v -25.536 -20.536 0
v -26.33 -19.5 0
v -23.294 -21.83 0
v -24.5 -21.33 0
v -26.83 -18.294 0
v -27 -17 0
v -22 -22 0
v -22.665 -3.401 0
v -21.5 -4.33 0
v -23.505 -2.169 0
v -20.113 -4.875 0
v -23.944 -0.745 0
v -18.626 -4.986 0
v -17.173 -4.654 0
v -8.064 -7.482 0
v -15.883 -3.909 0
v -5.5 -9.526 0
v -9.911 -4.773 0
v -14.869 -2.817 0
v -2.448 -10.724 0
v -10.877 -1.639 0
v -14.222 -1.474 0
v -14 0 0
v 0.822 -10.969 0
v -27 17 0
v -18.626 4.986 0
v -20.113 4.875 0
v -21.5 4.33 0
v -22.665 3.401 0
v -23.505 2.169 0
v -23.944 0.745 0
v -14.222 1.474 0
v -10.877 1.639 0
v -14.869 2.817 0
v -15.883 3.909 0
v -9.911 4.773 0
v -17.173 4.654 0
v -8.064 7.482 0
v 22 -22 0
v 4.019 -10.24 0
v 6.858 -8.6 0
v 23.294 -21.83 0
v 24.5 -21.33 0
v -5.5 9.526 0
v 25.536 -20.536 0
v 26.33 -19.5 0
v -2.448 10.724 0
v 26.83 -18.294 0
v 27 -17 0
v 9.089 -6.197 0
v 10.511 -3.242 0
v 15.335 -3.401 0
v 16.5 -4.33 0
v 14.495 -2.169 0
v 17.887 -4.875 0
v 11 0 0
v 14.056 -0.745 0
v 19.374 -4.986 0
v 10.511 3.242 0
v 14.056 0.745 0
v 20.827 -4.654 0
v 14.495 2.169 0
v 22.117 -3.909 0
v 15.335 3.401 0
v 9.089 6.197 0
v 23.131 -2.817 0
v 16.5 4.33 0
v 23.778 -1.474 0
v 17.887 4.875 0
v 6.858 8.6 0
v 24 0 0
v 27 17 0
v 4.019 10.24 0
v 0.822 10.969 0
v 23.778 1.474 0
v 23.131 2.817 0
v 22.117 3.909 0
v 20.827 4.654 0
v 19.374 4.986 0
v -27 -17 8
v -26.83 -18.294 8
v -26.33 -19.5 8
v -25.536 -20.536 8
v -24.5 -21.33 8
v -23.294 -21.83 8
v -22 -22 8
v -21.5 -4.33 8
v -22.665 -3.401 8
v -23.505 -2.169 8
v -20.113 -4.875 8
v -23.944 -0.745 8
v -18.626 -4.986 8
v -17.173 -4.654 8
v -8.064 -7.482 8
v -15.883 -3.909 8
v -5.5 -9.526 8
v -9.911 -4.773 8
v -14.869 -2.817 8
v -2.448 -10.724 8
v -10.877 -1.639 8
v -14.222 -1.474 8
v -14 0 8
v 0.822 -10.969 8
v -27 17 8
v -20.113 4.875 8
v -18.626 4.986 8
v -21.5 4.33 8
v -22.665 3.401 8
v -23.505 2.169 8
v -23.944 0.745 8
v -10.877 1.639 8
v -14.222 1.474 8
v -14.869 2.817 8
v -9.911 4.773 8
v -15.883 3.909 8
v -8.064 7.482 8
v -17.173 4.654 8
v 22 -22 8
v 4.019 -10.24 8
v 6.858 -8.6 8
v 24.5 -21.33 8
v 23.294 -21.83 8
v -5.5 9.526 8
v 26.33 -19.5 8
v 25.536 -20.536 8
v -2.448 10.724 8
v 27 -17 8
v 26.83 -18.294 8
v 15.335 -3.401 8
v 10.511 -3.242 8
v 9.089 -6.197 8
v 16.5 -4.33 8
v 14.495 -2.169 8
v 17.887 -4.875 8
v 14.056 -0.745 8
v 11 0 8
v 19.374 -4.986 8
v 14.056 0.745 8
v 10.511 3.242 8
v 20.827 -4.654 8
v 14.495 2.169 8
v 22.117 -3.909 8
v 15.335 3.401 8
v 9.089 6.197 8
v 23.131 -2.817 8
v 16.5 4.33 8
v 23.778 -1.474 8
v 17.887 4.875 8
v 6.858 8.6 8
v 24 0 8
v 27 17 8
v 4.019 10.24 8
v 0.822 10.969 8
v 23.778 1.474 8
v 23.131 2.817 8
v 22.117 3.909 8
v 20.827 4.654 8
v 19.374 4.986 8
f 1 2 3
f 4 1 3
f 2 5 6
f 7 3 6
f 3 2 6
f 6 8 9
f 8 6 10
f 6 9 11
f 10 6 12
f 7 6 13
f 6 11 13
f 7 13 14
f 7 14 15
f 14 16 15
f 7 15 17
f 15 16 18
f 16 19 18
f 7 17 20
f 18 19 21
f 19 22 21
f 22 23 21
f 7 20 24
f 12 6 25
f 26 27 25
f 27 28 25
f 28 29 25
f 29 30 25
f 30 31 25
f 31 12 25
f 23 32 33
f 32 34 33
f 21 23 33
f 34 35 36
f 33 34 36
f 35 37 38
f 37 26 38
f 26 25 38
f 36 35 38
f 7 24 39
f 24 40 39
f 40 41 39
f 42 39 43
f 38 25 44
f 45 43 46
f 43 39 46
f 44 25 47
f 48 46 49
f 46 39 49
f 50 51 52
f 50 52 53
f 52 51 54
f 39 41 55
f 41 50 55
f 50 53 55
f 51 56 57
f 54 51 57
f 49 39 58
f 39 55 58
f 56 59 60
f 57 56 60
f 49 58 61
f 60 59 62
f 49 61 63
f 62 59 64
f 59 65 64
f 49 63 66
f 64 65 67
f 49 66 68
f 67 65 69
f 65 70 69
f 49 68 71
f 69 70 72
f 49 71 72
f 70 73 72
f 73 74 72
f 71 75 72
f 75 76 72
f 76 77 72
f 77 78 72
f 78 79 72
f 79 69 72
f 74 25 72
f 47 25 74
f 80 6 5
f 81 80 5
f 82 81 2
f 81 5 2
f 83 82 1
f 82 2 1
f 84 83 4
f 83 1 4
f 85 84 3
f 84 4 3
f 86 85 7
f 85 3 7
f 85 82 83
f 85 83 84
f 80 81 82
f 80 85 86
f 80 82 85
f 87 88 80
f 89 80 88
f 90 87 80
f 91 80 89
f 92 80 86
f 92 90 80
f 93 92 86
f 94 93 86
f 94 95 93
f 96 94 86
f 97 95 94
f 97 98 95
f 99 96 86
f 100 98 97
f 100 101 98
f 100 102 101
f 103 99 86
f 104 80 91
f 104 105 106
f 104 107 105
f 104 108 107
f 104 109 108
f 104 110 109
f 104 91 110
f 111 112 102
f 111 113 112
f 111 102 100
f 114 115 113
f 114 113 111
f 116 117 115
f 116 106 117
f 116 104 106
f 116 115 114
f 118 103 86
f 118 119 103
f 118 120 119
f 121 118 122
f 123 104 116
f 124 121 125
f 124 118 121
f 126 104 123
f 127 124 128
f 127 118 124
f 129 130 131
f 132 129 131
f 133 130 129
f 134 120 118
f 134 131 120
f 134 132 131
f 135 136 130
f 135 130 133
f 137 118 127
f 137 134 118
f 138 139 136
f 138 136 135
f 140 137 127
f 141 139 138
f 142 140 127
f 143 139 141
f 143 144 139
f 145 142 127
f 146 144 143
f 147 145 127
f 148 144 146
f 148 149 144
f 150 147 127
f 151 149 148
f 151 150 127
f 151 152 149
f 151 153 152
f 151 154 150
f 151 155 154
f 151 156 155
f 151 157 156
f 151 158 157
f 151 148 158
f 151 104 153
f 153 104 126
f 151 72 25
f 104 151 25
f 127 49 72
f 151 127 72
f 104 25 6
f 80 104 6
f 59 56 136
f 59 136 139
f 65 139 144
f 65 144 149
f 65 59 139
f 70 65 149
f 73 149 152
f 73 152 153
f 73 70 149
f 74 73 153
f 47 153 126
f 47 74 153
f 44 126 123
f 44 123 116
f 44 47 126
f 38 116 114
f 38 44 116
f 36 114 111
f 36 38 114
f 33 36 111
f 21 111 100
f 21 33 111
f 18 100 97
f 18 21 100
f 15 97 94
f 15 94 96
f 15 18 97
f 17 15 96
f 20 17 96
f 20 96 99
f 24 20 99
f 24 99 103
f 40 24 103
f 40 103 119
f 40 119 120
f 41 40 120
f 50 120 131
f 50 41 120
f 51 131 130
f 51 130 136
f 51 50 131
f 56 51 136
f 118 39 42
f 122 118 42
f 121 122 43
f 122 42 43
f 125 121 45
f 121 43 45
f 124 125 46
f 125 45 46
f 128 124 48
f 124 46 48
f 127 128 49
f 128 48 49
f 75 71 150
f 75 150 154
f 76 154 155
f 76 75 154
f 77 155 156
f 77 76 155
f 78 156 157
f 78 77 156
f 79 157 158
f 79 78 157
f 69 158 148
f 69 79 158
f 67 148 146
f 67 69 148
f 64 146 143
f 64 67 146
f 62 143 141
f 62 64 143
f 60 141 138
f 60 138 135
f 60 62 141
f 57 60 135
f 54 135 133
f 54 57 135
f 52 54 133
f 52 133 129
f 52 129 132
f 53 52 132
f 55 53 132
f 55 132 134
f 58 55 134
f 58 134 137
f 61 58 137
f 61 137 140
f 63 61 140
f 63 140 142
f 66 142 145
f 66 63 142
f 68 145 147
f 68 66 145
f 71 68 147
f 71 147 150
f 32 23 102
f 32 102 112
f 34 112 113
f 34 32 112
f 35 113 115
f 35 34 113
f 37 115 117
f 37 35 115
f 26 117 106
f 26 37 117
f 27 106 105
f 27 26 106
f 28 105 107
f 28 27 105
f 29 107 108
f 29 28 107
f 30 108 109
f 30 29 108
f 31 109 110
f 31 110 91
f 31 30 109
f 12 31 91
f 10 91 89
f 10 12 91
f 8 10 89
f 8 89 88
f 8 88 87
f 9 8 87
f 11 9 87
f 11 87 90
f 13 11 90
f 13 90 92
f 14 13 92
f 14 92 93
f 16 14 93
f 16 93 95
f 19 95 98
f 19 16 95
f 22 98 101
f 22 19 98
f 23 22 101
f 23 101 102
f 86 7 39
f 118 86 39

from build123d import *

# Parameters (mm, degrees)
SKETCH1_R           = 5
SKETCH1_R_2         = 11
BOSS_EXTRUDE1_DEPTH = 8


with BuildPart() as part:
    # Sketch1 → Boss-Extrude1 (new body)
    with BuildSketch(Plane.XY):
        with BuildLine():
            Line((-22, -22), (22, -22))
            ThreePointArc((22, -22), (25.535533906, -20.535533906), (27, -17))
            Line((27, -17), (27, 17))
            Line((27, 17), (-27, 17))
            Line((-27, 17), (-27, -17))
            ThreePointArc((-27, -17), (-25.535533906, -20.535533906), (-22, -22))
        make_face()
        with Locations((-19, 0)):
            Circle(SKETCH1_R, mode=Mode.SUBTRACT)
        with Locations((19, 0)):
            Circle(SKETCH1_R, mode=Mode.SUBTRACT)
        Circle(SKETCH1_R_2, mode=Mode.SUBTRACT)
    extrude(amount=BOSS_EXTRUDE1_DEPTH)


solid = part.part
